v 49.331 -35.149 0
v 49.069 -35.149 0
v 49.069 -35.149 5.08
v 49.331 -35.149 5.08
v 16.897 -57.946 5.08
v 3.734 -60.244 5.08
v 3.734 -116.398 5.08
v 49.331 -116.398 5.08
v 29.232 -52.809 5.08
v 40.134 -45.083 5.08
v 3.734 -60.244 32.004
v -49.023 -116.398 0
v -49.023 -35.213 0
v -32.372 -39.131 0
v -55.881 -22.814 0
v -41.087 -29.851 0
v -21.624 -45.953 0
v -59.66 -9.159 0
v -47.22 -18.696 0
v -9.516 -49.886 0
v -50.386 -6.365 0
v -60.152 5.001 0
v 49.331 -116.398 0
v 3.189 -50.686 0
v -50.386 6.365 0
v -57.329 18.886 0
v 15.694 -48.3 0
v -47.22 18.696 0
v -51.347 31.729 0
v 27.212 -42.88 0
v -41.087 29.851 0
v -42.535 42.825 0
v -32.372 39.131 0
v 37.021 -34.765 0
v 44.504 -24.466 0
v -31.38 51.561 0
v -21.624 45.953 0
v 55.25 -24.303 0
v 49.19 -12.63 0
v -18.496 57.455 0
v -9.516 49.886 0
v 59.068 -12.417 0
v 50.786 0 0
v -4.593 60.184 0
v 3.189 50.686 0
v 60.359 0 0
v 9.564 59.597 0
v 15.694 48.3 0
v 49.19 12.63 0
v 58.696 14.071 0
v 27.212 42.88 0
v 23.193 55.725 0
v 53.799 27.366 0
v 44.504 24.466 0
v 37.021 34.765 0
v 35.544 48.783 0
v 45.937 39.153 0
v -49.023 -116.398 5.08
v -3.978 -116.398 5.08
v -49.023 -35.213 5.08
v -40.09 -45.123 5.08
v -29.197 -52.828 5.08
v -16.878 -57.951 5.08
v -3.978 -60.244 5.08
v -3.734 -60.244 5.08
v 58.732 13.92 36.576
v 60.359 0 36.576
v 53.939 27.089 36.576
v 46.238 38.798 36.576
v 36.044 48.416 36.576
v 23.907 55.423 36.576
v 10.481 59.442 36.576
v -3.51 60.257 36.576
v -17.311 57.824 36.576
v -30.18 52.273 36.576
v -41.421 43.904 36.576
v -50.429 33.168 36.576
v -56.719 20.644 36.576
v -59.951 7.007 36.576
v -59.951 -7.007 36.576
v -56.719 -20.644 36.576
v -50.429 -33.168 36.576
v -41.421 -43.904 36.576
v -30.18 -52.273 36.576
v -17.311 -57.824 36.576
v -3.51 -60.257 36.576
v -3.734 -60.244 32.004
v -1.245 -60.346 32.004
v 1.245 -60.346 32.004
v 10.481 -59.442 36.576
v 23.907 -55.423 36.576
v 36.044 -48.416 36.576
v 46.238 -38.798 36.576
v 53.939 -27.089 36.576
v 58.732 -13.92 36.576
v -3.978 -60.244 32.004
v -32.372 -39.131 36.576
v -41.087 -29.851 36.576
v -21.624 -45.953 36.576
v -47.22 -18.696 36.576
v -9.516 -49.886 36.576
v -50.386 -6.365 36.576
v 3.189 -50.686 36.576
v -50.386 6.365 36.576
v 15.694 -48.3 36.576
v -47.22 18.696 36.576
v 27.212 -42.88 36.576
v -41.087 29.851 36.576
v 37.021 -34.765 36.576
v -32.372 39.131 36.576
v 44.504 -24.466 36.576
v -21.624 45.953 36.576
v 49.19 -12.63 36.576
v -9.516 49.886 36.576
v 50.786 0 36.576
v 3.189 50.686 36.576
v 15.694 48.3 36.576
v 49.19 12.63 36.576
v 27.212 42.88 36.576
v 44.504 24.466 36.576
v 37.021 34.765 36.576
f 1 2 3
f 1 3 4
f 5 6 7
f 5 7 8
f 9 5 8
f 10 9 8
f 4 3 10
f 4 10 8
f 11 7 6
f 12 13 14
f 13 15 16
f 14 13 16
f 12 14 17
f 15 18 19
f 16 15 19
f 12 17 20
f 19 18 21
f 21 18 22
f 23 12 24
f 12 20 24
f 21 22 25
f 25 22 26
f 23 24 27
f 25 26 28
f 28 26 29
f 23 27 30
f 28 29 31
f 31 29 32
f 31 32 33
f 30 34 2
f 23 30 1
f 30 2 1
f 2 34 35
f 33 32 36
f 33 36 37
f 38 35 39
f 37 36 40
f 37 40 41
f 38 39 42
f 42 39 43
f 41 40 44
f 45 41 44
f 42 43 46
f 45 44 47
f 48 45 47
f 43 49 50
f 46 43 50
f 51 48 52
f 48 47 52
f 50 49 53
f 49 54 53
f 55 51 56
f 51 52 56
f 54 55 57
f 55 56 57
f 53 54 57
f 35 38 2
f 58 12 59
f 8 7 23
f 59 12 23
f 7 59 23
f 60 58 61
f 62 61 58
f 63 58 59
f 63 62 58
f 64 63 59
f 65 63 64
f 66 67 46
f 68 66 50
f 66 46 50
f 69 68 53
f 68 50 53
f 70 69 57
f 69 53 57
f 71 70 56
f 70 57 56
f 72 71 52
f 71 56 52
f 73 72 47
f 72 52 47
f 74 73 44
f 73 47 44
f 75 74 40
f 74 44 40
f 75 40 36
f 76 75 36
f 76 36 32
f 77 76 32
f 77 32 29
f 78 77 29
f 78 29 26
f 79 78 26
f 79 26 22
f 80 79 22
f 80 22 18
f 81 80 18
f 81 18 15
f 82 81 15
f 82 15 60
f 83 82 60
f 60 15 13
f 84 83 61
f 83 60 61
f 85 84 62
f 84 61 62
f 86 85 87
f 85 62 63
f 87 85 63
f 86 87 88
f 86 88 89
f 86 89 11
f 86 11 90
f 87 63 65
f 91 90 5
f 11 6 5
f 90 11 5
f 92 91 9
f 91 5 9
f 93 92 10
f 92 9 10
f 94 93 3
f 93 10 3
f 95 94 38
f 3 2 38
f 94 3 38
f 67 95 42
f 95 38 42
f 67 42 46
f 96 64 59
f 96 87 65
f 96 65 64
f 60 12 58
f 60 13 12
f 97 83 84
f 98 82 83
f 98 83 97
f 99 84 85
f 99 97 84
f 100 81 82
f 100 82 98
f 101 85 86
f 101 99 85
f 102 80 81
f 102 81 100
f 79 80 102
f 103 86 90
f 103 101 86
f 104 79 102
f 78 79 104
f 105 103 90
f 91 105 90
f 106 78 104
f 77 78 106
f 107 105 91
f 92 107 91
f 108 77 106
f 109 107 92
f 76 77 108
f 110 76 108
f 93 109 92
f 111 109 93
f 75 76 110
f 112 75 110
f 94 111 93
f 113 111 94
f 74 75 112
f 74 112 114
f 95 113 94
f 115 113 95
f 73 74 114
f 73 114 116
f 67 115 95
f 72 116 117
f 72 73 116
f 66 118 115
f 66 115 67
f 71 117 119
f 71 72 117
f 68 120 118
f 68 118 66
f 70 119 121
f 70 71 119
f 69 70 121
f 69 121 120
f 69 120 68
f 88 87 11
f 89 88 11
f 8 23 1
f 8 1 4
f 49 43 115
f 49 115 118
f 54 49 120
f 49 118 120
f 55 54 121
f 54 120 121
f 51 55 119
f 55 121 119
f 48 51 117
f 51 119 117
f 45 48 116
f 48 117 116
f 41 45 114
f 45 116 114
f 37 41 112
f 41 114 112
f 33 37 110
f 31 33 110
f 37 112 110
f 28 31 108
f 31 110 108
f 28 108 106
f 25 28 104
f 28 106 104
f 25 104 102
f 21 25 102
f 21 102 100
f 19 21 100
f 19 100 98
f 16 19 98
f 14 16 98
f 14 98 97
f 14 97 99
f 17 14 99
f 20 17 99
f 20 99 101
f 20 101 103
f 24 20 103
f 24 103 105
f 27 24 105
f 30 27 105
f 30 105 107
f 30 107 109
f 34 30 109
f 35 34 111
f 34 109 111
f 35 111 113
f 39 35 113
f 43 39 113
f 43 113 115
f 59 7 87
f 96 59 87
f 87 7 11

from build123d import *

# Parameters (mm, degrees)
F0_R      = 60.3592367884
F1_DEPTH  = 36.576
F2_W      = 98.3545593917
F2_H      = 66.0087950528
F3_DEPTH  = 5.08
F4_R      = 50.7859823722
F5_DEPTH  = 63.754
F6_DEPTH  = 15.24
F8_DEPTH  = 26.924
F10_DEPTH = 61.722


with BuildPart() as f1:
    # F0 (on Top) → F1 (new body)
    with BuildSketch(Plane.XY):
        Circle(F0_R)
    extrude(amount=F1_DEPTH)

    # F2 (on Top) → F3 (join)
    with BuildSketch(Plane.XY):
        with Locations((0.1538116485, -68.1532975286)):
            Rectangle(F2_W, F2_H)
    extrude(amount=F3_DEPTH)

    # F4 (on face) → F5 (cut)
    with BuildSketch(Plane.XY.offset(36.576)):
        Circle(F4_R)
    extrude(amount=-F5_DEPTH, mode=Mode.SUBTRACT)

    # F6 (add): a face of the model
    f6_faces = [f1.faces().sort_by_distance(p)[0] for p in [
        (0.1538116485, -101.157695055, 2.54),
    ]]
    extrude(f6_faces, amount=F6_DEPTH)

    # F7 (on face) → F8 (join)
    with BuildSketch(Plane.XY.offset(5.08)):
        with BuildLine():
            Line((-3.9780647494, -60.2436316555), (-3.9780647494, -116.397695055))
            Line((-3.9780647494, -116.397695055), (3.7339403637, -116.397695055))
            Line((3.7339403637, -116.397695055), (3.7339403637, -60.2436316555))
            ThreePointArc((3.7339403637, -60.2436316555), (0, -60.3592367884), (-3.7339403636, -60.2436316555))
            Line((-3.7339403636, -60.2436316555), (-3.9780647494, -60.2436316555))
        make_face()
    extrude(amount=F8_DEPTH)

    # F9 (on face) → F10 (cut)
    with BuildSketch(Plane.YZ.offset(3.7339403637)):
        Polygon((-116.397695055, 32.004), (-116.397695055, 5.08), (-60.2436316555, 32.004), align=None)
    extrude(amount=-F10_DEPTH, mode=Mode.SUBTRACT)


solid = f1.part
